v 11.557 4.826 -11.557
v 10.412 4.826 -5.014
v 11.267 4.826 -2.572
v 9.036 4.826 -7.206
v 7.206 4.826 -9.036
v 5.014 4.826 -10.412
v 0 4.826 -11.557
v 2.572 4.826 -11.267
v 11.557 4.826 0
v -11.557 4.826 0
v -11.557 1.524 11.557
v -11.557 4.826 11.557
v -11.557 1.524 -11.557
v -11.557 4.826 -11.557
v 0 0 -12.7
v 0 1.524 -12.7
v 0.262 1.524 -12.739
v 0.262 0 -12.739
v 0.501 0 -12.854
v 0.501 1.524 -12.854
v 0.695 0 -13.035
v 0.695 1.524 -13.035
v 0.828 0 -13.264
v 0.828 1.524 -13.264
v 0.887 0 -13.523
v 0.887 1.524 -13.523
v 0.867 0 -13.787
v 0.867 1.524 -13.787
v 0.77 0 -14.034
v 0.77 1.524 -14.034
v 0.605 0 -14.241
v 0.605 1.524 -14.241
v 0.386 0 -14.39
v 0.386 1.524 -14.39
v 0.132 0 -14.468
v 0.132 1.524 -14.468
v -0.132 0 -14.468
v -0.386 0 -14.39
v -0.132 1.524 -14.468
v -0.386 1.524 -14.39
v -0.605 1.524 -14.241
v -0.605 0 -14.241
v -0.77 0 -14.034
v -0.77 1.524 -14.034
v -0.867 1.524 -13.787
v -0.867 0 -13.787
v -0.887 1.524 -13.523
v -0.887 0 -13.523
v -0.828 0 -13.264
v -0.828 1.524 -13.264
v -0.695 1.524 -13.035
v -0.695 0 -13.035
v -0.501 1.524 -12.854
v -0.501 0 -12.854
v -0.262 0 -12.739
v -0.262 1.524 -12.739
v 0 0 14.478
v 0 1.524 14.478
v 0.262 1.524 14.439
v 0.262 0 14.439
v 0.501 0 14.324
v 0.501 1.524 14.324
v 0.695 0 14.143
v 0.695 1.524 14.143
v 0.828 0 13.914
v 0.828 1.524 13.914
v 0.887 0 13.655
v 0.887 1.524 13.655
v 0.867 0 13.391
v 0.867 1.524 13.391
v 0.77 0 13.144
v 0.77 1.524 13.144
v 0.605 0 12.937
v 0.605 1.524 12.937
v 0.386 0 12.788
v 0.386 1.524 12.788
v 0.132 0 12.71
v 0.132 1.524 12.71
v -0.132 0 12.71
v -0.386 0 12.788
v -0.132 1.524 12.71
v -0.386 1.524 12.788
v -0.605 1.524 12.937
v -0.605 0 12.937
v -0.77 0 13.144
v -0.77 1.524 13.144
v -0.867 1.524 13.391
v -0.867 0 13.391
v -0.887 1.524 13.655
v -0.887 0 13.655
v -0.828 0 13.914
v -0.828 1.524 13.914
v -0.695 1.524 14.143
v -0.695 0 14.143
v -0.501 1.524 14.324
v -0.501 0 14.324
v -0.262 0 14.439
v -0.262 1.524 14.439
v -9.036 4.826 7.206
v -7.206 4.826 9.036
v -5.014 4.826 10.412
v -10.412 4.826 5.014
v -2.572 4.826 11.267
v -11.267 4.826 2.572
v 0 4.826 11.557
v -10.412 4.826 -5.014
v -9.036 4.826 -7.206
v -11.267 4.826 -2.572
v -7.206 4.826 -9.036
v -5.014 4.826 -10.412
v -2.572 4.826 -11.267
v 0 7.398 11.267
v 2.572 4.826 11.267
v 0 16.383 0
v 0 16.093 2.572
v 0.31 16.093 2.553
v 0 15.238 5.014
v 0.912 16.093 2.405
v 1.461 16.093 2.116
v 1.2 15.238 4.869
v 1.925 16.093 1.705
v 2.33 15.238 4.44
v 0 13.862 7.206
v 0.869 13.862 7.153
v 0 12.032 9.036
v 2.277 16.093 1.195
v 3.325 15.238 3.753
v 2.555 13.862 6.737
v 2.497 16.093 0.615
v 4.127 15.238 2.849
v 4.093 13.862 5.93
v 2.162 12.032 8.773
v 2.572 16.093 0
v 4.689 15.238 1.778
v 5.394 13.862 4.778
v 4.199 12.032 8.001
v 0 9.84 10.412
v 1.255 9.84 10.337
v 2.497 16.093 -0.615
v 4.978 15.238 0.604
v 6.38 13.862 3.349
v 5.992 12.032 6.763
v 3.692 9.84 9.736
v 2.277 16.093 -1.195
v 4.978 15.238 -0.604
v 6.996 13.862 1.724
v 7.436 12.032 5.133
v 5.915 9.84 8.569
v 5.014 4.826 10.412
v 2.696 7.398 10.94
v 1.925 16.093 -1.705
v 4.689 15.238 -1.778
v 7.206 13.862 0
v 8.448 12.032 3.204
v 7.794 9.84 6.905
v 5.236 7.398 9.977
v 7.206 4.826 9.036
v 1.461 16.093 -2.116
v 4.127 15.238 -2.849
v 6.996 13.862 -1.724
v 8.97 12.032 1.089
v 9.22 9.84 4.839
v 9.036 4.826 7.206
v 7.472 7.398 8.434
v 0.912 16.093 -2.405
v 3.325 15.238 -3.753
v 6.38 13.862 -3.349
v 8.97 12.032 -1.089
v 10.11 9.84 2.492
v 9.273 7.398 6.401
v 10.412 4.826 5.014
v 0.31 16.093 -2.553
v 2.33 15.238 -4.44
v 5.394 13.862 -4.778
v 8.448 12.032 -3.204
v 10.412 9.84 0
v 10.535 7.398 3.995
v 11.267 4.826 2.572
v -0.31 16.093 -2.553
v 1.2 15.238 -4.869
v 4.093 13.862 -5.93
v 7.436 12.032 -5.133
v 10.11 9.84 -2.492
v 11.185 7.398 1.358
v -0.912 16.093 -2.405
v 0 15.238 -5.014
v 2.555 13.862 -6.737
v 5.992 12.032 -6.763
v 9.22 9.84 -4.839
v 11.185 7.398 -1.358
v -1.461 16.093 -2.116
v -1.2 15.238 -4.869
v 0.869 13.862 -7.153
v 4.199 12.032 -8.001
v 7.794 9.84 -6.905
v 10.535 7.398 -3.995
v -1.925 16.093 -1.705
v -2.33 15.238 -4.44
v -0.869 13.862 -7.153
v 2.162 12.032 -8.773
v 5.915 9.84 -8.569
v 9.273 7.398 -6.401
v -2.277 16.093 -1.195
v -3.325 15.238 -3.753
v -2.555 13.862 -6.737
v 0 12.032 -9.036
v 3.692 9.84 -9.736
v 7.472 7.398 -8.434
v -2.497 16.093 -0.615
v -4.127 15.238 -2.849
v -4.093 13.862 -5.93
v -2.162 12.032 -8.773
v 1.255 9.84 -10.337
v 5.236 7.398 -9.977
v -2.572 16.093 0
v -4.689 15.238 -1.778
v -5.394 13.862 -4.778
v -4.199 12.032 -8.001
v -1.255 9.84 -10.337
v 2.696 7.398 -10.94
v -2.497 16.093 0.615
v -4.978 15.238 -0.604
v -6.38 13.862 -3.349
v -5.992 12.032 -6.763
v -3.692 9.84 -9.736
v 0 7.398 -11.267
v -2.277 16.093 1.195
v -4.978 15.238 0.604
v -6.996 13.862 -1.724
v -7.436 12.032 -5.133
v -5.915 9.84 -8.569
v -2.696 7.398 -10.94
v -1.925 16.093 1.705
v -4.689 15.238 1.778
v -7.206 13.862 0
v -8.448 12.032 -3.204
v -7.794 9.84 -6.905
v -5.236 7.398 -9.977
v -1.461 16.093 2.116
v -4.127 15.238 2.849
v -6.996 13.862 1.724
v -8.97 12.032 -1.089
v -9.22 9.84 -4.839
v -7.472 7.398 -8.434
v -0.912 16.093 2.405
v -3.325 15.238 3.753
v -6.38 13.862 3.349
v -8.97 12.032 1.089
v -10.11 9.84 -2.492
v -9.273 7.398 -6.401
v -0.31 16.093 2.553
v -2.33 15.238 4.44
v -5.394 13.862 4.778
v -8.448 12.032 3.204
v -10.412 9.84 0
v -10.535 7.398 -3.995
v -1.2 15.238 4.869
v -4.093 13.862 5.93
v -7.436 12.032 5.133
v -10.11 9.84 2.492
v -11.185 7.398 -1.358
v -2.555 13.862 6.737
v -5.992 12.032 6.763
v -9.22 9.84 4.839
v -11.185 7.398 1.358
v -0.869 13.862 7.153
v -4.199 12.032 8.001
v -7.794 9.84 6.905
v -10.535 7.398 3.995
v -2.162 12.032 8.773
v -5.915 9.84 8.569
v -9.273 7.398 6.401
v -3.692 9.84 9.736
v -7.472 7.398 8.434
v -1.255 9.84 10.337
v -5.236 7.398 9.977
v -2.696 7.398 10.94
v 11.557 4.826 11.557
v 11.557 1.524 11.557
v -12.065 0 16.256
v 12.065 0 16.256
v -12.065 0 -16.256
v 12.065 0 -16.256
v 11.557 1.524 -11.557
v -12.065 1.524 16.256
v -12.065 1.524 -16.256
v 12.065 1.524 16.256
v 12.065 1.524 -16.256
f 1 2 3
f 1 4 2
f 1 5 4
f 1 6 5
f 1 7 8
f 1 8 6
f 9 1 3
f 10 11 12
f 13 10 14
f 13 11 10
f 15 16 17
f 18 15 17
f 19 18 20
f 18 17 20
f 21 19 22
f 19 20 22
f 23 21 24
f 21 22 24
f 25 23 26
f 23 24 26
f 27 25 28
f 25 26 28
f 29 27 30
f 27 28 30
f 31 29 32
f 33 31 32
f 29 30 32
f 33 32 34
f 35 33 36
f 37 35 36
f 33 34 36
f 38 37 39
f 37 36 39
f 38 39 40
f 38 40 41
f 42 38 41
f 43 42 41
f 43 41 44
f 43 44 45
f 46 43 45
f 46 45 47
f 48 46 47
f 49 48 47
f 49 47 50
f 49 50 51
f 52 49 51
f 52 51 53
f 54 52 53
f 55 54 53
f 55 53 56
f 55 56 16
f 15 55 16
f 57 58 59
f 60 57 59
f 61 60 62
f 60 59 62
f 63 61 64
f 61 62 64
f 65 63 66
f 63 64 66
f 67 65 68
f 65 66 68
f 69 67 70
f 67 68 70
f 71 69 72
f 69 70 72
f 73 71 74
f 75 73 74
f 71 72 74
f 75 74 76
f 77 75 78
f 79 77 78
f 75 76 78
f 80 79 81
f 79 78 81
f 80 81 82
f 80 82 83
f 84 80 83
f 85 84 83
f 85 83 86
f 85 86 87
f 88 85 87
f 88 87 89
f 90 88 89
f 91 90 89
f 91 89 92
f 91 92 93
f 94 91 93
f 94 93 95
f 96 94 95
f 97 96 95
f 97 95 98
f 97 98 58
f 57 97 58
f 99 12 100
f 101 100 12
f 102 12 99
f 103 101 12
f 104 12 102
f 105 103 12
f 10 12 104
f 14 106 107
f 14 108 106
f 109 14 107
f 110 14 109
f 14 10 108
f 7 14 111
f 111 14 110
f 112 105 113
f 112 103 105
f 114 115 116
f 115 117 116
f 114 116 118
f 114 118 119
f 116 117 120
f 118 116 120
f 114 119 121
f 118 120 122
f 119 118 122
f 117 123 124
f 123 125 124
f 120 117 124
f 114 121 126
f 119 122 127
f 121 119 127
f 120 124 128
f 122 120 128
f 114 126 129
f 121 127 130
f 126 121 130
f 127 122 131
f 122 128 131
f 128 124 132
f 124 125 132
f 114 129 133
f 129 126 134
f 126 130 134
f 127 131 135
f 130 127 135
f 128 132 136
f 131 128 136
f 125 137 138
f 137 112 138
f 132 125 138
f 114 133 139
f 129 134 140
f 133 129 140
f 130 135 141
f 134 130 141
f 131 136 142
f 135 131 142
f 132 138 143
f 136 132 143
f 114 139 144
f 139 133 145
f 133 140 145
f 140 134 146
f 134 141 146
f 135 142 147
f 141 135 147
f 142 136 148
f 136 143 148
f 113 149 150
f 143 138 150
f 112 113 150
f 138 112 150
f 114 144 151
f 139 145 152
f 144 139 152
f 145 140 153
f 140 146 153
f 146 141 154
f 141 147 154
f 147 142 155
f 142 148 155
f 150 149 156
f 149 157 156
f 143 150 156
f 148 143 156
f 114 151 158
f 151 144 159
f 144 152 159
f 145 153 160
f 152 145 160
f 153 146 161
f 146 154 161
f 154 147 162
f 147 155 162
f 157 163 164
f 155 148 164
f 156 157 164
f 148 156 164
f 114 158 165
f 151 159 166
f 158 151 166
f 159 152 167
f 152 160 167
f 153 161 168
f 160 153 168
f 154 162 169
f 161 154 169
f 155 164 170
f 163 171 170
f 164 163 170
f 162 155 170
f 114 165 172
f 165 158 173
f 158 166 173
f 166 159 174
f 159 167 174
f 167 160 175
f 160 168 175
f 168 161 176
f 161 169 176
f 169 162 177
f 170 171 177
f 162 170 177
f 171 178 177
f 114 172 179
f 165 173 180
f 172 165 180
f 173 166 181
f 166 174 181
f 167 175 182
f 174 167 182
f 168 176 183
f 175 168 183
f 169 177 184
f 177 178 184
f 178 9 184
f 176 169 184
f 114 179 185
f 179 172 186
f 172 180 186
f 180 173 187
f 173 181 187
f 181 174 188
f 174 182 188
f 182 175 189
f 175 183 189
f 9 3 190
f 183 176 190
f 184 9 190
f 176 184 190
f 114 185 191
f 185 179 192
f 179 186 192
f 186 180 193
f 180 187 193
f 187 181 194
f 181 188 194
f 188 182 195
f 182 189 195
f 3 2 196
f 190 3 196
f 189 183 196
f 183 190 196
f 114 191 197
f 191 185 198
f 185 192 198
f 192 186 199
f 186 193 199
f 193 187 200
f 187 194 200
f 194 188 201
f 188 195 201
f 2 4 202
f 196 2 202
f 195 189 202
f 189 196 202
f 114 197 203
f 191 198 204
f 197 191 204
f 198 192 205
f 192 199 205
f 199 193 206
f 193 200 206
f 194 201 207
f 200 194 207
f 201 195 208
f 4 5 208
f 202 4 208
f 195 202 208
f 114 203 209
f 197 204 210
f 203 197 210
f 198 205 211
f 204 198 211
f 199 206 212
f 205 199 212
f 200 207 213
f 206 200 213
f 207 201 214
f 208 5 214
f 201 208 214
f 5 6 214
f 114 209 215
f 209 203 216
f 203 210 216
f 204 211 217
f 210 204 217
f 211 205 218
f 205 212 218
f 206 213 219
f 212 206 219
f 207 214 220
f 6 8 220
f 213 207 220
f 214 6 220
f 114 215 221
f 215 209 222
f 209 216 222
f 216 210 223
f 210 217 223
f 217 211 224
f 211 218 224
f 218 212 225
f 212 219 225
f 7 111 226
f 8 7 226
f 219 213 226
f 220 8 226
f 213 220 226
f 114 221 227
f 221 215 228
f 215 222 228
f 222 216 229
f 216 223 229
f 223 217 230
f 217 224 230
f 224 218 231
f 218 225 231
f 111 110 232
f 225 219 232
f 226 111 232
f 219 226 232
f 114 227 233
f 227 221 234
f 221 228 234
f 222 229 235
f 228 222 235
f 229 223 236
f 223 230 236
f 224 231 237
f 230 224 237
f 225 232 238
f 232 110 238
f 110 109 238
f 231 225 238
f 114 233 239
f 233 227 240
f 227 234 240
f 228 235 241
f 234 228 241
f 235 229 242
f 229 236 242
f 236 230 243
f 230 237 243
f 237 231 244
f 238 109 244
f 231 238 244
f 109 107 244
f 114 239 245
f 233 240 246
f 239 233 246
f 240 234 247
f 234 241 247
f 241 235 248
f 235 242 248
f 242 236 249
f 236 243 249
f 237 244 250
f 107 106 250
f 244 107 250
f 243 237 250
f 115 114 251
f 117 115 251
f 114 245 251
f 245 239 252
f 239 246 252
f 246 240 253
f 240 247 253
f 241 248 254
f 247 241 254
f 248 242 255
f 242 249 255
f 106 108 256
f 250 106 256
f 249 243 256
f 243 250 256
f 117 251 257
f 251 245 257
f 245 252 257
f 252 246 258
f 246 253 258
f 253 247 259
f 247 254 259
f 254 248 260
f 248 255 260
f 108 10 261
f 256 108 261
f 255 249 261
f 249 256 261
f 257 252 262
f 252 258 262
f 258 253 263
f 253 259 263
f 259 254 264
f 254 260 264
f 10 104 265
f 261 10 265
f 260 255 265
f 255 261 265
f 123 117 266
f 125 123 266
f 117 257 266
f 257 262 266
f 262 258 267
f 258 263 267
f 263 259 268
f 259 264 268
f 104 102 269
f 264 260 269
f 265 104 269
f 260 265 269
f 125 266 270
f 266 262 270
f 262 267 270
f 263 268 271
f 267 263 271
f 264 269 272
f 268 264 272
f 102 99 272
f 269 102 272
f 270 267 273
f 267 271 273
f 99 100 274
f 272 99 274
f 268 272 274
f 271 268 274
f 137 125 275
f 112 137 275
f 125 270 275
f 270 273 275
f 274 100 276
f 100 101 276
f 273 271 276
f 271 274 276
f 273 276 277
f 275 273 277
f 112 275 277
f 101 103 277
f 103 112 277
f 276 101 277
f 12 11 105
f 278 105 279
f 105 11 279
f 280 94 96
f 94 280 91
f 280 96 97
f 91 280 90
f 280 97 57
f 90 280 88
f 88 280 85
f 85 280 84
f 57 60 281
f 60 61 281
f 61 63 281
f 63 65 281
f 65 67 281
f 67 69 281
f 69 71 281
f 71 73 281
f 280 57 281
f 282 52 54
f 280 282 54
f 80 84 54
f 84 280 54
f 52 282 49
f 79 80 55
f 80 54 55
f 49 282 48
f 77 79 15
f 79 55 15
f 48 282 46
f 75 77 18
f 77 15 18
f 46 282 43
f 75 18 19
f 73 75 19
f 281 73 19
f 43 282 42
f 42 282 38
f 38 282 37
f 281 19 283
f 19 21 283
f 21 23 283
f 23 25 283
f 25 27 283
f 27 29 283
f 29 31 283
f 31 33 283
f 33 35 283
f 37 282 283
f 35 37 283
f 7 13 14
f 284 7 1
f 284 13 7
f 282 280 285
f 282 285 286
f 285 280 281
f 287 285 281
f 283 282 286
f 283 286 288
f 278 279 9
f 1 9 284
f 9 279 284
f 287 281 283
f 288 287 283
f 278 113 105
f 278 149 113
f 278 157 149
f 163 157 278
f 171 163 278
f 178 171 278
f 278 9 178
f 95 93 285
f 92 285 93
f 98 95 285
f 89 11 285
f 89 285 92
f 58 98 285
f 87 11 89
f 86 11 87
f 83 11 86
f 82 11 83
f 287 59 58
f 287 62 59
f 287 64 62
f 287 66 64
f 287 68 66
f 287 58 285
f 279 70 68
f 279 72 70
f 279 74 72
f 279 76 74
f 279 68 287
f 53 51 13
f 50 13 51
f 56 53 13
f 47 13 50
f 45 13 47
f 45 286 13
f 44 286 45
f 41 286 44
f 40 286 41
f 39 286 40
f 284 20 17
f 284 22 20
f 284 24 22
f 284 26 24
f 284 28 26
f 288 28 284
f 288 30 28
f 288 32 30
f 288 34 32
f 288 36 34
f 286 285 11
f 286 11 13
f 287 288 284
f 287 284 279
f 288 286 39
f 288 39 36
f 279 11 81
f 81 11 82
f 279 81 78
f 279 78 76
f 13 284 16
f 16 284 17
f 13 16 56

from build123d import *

# Parameters (mm, degrees)
SKETCH1_W           = 24.13
SKETCH1_H           = 32.512
BOSS_EXTRUDE1_DEPTH = 1.524
SKETCH2_W           = 23.114
SKETCH2_H           = 23.114
BOSS_EXTRUDE2_DEPTH = 3.302
SKETCH5_R           = 0.889
CUT_EXTRUDE1_DEPTH  = 26.11198204


with BuildPart() as part:
    # Sketch1 → Boss-Extrude1 (new body)
    with BuildSketch(Plane(origin=(0, 0, 0), x_dir=(1, 0, 0), z_dir=(0, 1, 0))):
        Rectangle(SKETCH1_W, SKETCH1_H)
    extrude(amount=BOSS_EXTRUDE1_DEPTH)

    # Sketch2 → Boss-Extrude2 (add)
    with BuildSketch(Plane(origin=(0, 1.524, 0), x_dir=(1, 0, 0), z_dir=(0, 1, 0))):
        Rectangle(SKETCH2_W, SKETCH2_H)
    extrude(amount=BOSS_EXTRUDE2_DEPTH)

    # Sketch4 → Revolve1 (revolve)
    with BuildSketch(Plane(origin=(0, 0, 0), x_dir=(0, 0, -1), z_dir=(1, 0, 0))):
        with BuildLine():
            Line((0, 4.826), (0, 16.383))
            ThreePointArc((0, 16.383), (-8.17203307, 12.99803307), (-11.557, 4.826))
            Line((-11.557, 4.826), (0, 4.826))
        make_face()
    revolve(axis=Axis((0, 4.826, 0), (0, 1, 0)))

    # Sketch5 → Cut-Extrude1 (cut, through all)
    with BuildSketch(Plane(origin=(0, 1.524, 0), x_dir=(1, 0, 0), z_dir=(0, 1, 0))):
        with Locations(Location((0, -13.589, 0), (0, 0, 270))):
            Circle(SKETCH5_R)
        with Locations(Location((0, 13.589, 0), (0, 0, 270))):
            Circle(SKETCH5_R)
    extrude(amount=-CUT_EXTRUDE1_DEPTH, mode=Mode.SUBTRACT)


solid = part.part
